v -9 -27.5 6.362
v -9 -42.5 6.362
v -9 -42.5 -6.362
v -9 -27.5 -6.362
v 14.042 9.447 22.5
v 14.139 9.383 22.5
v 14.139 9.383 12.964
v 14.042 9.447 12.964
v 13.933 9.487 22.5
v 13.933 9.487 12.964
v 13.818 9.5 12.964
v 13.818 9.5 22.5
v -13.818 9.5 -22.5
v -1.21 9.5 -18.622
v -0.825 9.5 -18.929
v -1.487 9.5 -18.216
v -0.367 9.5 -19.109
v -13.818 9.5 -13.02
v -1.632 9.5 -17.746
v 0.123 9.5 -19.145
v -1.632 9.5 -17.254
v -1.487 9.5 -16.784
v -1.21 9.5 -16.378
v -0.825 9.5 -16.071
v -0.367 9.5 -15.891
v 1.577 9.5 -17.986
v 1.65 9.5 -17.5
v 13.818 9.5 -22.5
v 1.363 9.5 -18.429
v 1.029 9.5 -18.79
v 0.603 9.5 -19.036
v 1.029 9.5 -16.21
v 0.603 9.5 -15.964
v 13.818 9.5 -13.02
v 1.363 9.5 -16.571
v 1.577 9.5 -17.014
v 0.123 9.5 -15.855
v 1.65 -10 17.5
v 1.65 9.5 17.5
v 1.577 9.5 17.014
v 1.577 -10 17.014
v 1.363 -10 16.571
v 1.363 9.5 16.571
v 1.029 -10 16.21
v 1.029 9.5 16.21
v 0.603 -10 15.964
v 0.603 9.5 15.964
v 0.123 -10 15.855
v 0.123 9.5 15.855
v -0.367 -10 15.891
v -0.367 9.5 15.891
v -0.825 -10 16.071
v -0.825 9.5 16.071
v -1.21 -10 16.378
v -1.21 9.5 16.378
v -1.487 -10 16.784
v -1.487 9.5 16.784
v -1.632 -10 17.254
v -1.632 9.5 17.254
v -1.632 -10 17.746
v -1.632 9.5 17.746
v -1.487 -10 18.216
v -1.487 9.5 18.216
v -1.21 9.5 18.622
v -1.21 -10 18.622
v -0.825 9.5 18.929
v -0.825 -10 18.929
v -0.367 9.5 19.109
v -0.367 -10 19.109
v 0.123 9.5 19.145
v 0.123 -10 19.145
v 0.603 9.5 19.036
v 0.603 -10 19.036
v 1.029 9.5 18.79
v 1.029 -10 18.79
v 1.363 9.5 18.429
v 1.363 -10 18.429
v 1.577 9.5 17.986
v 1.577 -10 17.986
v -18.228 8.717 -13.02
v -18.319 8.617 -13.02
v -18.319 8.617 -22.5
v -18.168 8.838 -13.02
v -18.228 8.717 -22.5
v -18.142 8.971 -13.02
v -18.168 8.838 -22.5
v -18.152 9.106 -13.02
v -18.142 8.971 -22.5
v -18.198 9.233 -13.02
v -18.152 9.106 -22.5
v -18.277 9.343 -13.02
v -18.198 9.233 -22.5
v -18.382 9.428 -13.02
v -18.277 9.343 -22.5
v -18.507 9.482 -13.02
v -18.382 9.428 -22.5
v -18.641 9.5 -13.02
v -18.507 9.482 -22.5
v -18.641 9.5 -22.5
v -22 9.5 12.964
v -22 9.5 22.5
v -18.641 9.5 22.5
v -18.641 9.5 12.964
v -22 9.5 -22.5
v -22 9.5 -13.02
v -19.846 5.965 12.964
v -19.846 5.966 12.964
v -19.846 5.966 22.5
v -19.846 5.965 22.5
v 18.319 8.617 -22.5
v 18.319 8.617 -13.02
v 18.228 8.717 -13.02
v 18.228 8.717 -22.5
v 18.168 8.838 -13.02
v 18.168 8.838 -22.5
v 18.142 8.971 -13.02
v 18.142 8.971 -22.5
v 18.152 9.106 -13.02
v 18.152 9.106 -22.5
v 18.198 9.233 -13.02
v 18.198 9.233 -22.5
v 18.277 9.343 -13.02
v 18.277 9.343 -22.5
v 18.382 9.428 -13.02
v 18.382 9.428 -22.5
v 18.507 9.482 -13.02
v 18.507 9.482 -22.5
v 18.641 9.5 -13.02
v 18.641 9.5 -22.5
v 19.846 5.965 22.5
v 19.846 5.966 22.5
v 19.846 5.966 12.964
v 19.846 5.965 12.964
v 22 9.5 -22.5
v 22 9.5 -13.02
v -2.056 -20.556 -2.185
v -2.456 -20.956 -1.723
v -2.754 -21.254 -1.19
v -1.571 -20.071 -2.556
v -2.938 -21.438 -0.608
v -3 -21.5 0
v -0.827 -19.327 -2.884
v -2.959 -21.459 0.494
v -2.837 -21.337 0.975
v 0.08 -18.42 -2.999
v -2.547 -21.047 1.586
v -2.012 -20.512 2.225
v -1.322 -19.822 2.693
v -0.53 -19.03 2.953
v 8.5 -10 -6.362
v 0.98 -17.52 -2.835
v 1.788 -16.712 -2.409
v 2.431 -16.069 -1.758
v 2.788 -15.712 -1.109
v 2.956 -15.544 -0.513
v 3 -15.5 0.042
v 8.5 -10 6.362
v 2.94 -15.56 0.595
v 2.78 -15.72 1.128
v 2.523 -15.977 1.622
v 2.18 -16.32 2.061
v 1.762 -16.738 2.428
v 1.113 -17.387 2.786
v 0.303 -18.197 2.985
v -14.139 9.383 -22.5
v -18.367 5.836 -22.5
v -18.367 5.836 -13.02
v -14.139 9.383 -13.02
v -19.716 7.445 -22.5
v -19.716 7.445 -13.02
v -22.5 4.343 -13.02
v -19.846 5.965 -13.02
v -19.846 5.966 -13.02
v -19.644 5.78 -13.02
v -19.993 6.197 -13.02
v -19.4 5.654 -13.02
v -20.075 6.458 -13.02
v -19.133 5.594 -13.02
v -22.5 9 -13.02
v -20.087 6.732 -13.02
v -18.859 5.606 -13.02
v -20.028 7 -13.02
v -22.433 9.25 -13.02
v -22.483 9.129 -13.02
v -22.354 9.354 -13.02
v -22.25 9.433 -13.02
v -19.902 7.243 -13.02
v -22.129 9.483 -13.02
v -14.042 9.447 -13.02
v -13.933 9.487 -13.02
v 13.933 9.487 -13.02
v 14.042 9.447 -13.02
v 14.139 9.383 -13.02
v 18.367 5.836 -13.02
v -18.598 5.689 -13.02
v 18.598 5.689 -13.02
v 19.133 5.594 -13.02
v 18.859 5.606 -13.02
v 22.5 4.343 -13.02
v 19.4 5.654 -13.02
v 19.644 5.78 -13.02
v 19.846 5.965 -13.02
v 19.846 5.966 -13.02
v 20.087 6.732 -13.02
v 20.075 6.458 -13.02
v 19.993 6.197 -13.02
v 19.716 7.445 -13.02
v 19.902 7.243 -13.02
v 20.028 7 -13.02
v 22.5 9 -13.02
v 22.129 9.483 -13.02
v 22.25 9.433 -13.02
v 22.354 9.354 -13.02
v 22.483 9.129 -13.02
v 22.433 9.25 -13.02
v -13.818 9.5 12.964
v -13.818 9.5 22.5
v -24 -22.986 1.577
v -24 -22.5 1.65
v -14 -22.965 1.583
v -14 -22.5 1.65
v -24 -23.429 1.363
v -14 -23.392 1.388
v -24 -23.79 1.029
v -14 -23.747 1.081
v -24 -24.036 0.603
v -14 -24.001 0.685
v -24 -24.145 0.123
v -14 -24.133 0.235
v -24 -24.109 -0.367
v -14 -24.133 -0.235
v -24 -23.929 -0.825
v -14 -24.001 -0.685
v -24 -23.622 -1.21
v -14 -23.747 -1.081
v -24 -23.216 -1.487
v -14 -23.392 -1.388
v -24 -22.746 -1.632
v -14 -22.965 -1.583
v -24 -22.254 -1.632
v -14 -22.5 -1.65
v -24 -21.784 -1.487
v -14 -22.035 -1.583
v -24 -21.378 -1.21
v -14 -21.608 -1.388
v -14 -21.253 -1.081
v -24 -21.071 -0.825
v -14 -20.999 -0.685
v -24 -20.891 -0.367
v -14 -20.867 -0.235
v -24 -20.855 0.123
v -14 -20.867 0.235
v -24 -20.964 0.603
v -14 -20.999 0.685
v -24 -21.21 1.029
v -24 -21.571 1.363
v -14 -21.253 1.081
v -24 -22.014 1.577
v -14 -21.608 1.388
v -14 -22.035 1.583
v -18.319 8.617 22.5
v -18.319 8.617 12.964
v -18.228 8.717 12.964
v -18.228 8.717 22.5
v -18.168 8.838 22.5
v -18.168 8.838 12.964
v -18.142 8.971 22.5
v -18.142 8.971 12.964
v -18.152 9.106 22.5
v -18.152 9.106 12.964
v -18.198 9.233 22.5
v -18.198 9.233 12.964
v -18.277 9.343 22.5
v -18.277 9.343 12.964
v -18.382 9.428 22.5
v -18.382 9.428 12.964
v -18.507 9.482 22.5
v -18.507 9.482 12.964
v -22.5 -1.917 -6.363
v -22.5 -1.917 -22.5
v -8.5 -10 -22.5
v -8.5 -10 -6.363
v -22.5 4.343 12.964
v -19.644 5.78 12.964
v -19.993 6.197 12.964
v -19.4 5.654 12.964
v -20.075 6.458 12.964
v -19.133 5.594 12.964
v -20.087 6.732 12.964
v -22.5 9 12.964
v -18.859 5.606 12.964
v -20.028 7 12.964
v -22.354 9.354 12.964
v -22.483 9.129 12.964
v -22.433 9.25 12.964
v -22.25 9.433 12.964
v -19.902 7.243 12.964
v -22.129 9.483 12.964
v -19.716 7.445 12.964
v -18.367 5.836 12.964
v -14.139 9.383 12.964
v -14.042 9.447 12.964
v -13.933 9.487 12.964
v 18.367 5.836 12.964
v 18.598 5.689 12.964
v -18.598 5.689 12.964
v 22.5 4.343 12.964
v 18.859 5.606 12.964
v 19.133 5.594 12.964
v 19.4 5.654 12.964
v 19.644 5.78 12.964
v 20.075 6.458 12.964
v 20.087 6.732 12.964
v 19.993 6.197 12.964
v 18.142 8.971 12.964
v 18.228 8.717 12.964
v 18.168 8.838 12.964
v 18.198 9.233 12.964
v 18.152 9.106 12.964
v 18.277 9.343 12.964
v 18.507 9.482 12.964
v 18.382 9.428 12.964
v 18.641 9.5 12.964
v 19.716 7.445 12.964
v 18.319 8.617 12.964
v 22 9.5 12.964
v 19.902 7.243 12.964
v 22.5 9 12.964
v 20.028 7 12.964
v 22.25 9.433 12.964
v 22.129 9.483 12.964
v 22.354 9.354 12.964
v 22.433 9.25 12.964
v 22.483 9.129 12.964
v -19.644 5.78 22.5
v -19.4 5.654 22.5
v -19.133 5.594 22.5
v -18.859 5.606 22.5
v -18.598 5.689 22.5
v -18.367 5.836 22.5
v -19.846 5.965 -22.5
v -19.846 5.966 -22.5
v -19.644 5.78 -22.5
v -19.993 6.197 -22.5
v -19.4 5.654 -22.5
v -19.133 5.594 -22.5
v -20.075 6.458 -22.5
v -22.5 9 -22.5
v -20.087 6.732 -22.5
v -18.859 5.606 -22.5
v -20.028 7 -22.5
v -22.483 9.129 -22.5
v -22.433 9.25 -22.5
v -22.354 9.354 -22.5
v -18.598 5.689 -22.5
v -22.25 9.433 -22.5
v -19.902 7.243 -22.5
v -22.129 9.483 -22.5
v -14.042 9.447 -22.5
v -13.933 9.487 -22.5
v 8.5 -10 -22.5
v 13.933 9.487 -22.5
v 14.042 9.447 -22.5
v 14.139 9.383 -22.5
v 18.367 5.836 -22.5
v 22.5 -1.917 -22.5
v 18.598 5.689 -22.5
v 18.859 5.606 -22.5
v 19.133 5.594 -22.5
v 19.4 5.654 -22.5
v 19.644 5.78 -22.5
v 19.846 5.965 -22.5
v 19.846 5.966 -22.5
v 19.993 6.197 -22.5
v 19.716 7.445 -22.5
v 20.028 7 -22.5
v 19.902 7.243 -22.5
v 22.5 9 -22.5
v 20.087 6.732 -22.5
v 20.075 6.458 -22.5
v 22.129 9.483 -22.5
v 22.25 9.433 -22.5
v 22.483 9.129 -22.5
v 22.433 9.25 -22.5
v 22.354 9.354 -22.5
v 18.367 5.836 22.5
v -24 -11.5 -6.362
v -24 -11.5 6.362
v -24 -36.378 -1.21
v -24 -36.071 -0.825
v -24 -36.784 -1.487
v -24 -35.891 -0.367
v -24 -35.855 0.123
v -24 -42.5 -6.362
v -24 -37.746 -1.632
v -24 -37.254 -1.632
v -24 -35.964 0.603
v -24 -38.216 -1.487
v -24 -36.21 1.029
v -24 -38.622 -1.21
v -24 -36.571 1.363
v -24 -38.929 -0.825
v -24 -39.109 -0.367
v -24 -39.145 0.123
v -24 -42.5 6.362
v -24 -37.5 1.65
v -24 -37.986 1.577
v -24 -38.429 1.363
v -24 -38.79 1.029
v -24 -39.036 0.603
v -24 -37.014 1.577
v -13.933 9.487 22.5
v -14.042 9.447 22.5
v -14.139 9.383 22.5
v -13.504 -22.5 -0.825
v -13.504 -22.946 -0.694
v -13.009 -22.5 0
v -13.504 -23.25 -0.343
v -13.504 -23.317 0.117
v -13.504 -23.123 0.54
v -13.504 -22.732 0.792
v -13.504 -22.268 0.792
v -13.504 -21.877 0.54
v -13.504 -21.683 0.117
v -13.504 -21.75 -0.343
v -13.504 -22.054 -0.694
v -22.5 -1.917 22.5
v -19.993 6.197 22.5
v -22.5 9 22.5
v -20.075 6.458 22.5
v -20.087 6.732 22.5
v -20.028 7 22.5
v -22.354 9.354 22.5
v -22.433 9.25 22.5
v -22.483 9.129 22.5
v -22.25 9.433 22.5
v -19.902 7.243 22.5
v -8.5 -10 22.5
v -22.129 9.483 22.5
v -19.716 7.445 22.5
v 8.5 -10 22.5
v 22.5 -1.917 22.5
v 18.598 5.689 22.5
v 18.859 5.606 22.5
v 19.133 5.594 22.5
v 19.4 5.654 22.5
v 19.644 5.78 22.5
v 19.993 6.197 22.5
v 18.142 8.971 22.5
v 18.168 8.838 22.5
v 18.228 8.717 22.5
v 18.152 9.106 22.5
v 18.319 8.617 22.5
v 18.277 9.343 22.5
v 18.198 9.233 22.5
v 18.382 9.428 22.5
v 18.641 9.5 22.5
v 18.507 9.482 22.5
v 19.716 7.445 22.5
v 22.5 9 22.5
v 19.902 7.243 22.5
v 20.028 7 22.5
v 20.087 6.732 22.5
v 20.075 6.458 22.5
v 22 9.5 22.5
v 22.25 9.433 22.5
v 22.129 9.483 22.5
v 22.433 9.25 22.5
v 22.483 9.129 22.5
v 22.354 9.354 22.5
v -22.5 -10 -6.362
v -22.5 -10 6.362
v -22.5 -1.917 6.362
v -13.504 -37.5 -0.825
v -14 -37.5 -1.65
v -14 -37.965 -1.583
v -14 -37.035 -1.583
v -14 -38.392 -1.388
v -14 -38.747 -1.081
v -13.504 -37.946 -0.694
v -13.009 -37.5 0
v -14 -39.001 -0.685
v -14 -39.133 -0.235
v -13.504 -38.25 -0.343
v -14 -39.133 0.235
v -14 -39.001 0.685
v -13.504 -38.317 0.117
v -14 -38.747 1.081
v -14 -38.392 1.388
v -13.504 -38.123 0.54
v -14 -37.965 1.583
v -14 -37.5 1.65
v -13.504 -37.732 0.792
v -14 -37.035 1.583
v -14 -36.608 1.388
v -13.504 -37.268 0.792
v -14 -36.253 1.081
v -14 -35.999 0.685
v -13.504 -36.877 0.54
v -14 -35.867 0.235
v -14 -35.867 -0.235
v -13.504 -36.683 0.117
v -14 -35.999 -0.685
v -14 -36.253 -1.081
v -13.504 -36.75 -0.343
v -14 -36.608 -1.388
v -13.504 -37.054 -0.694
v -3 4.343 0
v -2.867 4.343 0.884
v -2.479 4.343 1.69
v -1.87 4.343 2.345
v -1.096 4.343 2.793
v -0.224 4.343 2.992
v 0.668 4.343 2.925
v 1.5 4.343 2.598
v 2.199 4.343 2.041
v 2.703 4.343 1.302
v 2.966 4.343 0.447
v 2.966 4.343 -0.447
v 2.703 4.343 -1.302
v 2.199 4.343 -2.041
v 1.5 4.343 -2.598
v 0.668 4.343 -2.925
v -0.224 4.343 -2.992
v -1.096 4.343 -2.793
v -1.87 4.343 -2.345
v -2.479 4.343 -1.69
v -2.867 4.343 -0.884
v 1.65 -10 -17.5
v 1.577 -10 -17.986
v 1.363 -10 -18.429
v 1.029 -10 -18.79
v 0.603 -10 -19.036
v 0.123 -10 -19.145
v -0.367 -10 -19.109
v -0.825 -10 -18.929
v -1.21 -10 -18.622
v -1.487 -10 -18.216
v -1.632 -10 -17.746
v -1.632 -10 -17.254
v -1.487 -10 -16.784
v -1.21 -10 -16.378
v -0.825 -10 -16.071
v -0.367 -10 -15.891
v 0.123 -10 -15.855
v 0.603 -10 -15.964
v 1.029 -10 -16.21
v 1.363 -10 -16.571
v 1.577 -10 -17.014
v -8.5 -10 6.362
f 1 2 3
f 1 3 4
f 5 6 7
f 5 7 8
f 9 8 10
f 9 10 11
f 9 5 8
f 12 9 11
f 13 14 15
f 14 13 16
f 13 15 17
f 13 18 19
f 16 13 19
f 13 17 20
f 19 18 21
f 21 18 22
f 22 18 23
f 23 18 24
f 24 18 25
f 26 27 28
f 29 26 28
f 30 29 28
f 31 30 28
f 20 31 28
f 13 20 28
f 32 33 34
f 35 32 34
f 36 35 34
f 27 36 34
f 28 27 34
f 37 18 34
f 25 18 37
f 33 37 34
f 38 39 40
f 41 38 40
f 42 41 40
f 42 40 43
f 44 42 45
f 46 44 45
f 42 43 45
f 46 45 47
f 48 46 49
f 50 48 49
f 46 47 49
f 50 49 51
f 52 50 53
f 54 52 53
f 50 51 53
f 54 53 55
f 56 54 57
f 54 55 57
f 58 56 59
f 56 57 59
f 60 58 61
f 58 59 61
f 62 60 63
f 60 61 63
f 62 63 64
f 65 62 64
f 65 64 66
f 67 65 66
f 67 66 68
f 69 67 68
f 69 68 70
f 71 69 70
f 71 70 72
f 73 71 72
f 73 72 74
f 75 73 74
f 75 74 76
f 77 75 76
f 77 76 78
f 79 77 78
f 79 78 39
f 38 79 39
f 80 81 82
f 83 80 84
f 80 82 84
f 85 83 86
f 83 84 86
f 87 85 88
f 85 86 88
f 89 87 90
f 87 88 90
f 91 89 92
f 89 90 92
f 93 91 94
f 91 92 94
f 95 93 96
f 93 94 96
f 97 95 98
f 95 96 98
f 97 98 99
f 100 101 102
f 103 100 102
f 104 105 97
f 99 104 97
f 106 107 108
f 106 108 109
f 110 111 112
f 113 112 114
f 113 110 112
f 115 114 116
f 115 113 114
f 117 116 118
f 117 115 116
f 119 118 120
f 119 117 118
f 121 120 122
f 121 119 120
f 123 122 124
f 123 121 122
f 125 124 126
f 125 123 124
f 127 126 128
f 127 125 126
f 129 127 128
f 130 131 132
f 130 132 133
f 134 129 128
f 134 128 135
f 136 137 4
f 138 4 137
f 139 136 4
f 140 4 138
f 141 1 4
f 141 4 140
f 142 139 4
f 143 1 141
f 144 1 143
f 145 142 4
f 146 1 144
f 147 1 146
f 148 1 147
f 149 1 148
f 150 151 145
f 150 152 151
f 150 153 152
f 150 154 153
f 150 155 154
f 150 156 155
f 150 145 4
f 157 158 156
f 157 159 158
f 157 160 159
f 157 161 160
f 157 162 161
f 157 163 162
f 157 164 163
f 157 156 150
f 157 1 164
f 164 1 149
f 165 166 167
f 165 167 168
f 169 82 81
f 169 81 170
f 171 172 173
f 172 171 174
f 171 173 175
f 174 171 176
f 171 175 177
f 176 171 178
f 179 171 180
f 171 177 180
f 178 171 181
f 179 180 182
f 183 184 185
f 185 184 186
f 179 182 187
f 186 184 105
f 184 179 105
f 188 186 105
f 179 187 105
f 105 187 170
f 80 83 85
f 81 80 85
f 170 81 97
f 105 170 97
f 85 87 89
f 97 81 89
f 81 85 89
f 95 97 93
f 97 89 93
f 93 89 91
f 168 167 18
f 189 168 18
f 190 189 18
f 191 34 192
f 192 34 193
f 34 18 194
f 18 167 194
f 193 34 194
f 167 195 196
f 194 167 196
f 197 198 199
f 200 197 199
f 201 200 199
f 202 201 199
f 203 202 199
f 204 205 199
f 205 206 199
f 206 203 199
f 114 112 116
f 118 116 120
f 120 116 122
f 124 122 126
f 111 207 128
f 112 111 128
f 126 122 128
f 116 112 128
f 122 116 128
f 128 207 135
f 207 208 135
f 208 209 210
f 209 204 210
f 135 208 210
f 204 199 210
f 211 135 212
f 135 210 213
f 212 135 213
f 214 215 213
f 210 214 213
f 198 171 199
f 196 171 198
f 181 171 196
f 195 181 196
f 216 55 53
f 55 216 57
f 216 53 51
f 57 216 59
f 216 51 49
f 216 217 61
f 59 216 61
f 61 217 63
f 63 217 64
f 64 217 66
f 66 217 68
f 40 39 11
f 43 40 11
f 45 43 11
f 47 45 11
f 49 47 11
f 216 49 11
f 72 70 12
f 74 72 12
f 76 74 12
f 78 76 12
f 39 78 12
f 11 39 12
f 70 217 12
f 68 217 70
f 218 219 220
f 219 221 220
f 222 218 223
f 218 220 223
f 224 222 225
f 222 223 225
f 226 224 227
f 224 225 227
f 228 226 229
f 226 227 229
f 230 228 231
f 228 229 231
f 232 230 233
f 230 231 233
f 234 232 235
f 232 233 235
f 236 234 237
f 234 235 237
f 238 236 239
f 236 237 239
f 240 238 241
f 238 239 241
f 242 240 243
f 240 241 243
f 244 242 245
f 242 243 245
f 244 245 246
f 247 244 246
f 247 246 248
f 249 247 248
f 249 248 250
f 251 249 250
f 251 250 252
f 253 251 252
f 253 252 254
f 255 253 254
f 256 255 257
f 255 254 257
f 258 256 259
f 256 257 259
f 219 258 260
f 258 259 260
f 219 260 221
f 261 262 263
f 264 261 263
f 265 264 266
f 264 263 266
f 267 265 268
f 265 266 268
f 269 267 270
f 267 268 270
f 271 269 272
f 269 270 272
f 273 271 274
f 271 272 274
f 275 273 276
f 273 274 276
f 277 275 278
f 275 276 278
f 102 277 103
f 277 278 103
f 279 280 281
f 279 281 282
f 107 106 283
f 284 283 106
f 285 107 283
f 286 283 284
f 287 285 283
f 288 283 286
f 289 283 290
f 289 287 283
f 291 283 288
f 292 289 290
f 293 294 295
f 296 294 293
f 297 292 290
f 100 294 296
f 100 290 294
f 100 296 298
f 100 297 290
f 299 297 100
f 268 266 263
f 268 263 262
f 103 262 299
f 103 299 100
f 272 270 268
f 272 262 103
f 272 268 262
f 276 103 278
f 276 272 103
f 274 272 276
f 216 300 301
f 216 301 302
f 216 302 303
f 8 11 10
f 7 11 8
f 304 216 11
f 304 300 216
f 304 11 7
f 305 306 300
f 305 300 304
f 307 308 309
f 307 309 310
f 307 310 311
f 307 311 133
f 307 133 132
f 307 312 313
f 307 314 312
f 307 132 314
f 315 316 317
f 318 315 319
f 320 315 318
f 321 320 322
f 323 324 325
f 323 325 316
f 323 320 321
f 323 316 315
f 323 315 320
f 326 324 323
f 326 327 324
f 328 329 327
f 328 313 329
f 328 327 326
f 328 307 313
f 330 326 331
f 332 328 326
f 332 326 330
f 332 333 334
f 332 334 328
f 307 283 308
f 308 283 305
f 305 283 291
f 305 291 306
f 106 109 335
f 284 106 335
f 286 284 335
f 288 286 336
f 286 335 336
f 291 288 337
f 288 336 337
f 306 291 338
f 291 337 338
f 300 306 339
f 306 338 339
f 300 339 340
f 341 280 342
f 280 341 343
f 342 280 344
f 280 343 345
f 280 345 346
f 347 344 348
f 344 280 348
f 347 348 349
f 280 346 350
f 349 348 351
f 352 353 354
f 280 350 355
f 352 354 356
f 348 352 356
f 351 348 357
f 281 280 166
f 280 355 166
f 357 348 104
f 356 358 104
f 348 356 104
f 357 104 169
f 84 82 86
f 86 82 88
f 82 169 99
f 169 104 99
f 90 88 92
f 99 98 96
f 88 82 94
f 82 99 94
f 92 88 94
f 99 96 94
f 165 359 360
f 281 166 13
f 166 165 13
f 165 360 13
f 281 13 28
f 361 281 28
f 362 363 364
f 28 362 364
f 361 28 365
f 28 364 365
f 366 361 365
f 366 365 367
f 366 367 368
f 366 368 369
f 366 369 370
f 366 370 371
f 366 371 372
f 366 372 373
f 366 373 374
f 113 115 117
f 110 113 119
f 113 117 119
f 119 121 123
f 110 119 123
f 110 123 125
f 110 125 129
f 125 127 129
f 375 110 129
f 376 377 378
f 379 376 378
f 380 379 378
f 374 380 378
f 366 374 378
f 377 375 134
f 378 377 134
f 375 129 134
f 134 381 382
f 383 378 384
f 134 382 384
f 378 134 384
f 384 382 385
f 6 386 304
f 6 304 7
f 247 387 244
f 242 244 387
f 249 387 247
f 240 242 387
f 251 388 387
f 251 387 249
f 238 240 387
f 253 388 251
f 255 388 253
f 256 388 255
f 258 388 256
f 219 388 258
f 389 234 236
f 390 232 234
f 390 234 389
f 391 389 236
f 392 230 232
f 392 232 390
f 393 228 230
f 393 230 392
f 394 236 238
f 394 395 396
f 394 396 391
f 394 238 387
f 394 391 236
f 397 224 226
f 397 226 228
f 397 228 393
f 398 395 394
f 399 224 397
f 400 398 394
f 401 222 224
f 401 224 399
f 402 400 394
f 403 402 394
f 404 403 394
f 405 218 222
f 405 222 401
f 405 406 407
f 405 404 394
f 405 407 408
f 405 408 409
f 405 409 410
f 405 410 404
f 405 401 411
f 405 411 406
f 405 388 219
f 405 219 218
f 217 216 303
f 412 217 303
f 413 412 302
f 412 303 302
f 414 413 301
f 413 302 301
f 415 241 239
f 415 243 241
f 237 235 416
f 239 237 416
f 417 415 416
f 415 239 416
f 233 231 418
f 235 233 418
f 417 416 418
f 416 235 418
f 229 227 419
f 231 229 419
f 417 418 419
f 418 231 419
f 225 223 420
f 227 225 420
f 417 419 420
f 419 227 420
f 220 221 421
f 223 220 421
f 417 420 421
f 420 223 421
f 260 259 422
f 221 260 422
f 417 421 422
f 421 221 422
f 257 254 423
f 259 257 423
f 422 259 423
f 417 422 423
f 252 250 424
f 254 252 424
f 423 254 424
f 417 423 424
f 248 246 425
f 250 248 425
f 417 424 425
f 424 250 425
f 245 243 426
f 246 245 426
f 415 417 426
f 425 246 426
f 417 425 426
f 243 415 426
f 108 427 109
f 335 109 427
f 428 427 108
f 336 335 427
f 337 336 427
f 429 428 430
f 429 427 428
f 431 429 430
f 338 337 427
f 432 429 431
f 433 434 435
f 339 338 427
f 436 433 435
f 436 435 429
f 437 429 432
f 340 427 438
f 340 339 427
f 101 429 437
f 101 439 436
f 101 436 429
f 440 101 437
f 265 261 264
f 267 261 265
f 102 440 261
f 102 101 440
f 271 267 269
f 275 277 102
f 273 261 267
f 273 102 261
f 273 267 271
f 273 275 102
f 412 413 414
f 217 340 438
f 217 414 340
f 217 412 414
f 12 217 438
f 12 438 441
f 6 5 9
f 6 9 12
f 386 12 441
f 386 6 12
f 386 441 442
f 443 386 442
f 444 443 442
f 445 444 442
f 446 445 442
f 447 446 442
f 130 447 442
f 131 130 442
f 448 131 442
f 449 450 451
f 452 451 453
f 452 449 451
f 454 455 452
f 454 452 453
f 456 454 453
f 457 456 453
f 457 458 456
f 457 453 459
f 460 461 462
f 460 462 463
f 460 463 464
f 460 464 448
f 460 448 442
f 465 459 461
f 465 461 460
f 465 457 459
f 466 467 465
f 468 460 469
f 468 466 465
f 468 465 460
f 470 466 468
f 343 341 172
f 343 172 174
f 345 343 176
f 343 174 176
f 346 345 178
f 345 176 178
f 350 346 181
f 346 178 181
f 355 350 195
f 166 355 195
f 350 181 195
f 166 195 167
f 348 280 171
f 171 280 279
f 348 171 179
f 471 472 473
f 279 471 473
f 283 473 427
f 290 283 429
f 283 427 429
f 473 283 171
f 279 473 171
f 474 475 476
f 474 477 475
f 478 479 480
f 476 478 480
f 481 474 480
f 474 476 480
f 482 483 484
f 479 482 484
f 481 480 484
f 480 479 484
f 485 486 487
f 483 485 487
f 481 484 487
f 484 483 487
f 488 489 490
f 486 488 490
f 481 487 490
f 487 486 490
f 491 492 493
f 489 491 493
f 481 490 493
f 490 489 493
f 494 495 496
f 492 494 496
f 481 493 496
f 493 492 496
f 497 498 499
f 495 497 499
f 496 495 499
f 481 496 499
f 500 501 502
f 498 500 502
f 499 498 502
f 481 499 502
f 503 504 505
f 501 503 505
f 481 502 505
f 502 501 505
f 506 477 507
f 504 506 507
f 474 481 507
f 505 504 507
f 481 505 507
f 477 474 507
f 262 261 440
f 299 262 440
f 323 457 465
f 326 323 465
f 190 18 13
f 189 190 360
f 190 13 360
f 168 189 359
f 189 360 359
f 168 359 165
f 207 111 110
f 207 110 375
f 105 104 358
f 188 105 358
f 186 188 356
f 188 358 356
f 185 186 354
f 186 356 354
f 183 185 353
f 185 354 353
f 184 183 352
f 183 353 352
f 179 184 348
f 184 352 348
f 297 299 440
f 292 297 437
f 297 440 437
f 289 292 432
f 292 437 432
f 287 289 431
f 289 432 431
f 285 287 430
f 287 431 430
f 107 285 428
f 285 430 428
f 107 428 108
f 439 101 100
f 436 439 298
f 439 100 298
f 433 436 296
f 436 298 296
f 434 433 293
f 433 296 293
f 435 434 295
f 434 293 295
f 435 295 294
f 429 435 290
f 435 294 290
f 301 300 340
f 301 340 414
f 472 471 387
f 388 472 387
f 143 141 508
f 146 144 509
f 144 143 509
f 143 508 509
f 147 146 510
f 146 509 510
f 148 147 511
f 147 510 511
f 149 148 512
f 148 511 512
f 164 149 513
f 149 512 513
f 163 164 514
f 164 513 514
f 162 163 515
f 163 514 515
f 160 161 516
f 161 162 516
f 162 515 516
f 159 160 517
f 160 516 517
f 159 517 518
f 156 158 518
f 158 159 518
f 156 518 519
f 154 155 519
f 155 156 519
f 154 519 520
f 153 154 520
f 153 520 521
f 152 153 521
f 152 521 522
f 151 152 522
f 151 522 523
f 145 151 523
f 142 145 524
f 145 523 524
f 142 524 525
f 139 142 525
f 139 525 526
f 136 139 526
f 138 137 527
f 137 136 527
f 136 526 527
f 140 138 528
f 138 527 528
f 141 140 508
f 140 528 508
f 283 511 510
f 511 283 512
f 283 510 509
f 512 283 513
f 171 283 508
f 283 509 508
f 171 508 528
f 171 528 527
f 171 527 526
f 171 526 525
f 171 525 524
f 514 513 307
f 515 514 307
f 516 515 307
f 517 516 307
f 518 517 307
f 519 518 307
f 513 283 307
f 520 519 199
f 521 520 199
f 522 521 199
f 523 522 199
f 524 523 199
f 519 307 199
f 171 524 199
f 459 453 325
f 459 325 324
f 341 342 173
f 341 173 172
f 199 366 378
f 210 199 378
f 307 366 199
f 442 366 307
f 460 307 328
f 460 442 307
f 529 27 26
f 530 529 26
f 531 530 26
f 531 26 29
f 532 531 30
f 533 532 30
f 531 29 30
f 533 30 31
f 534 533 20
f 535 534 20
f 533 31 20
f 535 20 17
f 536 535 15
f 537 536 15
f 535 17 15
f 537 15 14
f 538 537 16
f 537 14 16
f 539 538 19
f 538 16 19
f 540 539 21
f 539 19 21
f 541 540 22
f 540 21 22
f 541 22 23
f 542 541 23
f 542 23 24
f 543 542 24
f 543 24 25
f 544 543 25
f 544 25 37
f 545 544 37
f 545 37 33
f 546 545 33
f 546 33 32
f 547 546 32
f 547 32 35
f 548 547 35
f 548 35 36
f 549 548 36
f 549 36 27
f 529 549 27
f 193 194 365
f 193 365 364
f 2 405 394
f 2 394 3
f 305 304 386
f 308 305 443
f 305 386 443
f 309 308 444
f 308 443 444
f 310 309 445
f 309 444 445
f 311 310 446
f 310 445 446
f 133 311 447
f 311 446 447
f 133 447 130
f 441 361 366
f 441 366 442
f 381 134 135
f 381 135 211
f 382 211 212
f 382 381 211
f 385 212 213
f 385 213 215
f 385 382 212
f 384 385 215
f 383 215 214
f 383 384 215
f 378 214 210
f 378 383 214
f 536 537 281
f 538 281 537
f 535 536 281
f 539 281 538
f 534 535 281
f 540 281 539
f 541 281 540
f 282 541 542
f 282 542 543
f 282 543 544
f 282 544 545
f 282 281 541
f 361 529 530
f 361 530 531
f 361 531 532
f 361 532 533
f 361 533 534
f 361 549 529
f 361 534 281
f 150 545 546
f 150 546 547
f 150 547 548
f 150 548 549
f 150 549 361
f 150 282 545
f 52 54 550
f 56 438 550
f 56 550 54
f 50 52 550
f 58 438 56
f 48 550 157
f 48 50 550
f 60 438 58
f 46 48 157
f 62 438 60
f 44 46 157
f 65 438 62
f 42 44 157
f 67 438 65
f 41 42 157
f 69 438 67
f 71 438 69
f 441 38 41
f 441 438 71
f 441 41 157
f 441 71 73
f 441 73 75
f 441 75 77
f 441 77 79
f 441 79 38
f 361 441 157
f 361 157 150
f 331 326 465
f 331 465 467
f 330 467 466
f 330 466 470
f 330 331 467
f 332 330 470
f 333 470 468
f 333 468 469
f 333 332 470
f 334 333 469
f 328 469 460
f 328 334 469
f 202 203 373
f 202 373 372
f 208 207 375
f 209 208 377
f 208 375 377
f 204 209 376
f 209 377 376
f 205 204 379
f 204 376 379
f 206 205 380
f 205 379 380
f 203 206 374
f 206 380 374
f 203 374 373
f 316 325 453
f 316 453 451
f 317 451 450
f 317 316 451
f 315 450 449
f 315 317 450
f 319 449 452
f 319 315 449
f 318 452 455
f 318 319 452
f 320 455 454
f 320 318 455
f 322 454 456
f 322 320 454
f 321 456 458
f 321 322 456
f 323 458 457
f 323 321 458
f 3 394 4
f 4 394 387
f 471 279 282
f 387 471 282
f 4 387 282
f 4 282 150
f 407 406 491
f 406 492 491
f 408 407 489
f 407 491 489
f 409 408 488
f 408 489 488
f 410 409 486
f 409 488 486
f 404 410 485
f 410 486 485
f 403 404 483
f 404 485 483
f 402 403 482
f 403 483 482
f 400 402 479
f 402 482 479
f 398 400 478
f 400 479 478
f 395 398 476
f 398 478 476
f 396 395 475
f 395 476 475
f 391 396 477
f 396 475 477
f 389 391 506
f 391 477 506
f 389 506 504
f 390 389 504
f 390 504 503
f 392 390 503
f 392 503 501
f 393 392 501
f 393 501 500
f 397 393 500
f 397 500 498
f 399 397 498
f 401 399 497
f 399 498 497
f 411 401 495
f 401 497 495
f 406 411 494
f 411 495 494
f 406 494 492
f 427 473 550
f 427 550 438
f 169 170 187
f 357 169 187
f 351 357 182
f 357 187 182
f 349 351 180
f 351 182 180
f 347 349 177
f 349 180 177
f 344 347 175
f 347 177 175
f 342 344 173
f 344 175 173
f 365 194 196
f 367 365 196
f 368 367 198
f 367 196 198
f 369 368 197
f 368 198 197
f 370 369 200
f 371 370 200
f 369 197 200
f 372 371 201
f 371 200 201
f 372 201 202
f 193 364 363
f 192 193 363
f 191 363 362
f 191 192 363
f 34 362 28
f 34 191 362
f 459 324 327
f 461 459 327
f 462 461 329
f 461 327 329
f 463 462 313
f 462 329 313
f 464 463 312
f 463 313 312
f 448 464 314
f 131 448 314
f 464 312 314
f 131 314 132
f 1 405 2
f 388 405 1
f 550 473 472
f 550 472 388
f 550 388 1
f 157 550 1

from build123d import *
from OCP.BRepFilletAPI import BRepFilletAPI_MakeChamfer

# Parameters (mm, degrees)
SKETCH1_W                 = 45
SKETCH1_H                 = 19.5
BOSS_EXTRUDE1_DEPTH       = 22.5
M4X0_7_TAPPED_HOLE2_D     = 3.3
BOSS_EXTRUDE3_DEPTH       = 6.3625
M4X0_7_TAPPED_HOLE1_D     = 3.3
M4X0_7_TAPPED_HOLE1_DEPTH = 10
M4X0_7_TAPPED_HOLE1_TIP   = 0.991420021
CUT_EXTRUDE2_DEPTH        = 85
SKETCH2_R                 = 3
CUT_EXTRUDE1_DEPTH        = 50
CUT_EXTRUDE3_DEPTH        = 25
FILLET1_R                 = 1.05
FILLET2_R                 = 1.05
FILLET3_R                 = 0.5
SKETCH12_W                = 25.984765903
SKETCH12_H                = 10.03603234
CUT_EXTRUDE4_DEPTH        = 72.15
CHAMFER1_SIZE             = 14
CHAMFER1_SIZE_2           = 8.082903769


with BuildPart() as part:
    # Sketch1 → Boss-Extrude1 (new, symmetric)
    with BuildSketch(Plane.XY):
        with Locations((0, -0.25)):
            Rectangle(SKETCH1_W, SKETCH1_H)
    extrude(amount=BOSS_EXTRUDE1_DEPTH, both=True)

    # M4x0.7 Tapped Hole2 (through all)
    with Locations(Plane(origin=(0, -10, 0), x_dir=(-1, 0, 0), z_dir=(0, -1, 0))):
        with Locations((0, -17.5), (0, 17.5)):
            Hole(M4X0_7_TAPPED_HOLE2_D / 2)

    # Sketch7 → Boss-Extrude3 (add, symmetric)
    with BuildSketch(Plane.XY):
        Polygon((-22.5, -7.5), (-24, -7.5), (-24, -42.5), (-9, -42.5), (-9, -27.5), (8.5, -10), (-22.5, -10), align=None)
    extrude(amount=BOSS_EXTRUDE3_DEPTH, both=True)

    # M4x0.7 Tapped Hole1
    with Locations(Plane(origin=(-24, 0, 0), x_dir=(0, 0, -1), z_dir=(-1, 0, 0))):
        with Locations((0, 37.5), (0, 22.5)):
            Hole(M4X0_7_TAPPED_HOLE1_D / 2, depth=M4X0_7_TAPPED_HOLE1_DEPTH)
            with Locations((0, 0, -(M4X0_7_TAPPED_HOLE1_DEPTH + M4X0_7_TAPPED_HOLE1_TIP / 2))):  # 118° drill point
                Cone(0, M4X0_7_TAPPED_HOLE1_D / 2, M4X0_7_TAPPED_HOLE1_TIP, mode=Mode.SUBTRACT)

    # Sketch10 → Cut-Extrude2 (cut)
    with BuildSketch(Plane(origin=(0, 0, -6.3625), x_dir=(-1, 0, 0), z_dir=(0, 0, -1))):
        Polygon((22.5, -10), (24, -11.5), (24, -7.5), (22.5, -7.5), align=None)
    extrude(amount=-CUT_EXTRUDE2_DEPTH, mode=Mode.SUBTRACT)

    # Sketch2 → Cut-Extrude1 (cut)
    with BuildSketch(Plane(origin=(0, 9.5, 0), x_dir=(1, 0, 0), z_dir=(0, 1, 0))):
        with Locations(Location((0, 0, 0), (0, 0, 180))):
            Circle(SKETCH2_R)
    extrude(amount=-CUT_EXTRUDE1_DEPTH, mode=Mode.SUBTRACT)

    # Sketch11 → Cut-Extrude3 (cut, symmetric)
    with BuildSketch(Plane.XY):
        Polygon((-17.267020036, 9.5), (-20.520653971, 6.769876965), (-19.170799991, 5.161183635), (-14, 9.5), align=None)
        Polygon((14, 9.5), (17.267020036, 9.5), (20.520653971, 6.769876965), (19.170799991, 5.161183635), align=None)
    extrude(amount=CUT_EXTRUDE3_DEPTH, both=True, mode=Mode.SUBTRACT)

    # Fillet1
    fillet1_edges = [part.edges().sort_by_distance(p)[0] for p in [
        (-19.170799991, 5.161183635, 0),
        (-20.520653971, 6.769876965, 0),
    ]]
    fillet(fillet1_edges, radius=FILLET1_R - 0.0001)  # a hair under: the kernel refuses the full size

    # Fillet2
    fillet2_edges = [part.edges().sort_by_distance(p)[0] for p in [
        (19.170799991, 5.161183635, 0),
        (20.520653971, 6.769876965, 0),
    ]]
    fillet(fillet2_edges, radius=FILLET2_R - 0.0001)  # a hair under: the kernel refuses the full size

    # Fillet3
    fillet3_edges = [part.edges().sort_by_distance(p)[0] for p in [
        (14, 9.5, 0),
        (17.267020036, 9.5, 0),
        (-22.5, 9.5, 0),
        (22.5, 9.5, 0),
        (-17.267020036, 9.5, 0),
        (-14, 9.5, 0),
    ]]
    fillet(fillet3_edges, radius=FILLET3_R)

    # Sketch12 → Cut-Extrude4 (cut)
    with BuildSketch(Plane(origin=(22.5, 0, 0), x_dir=(0, 0, -1), z_dir=(1, 0, 0))):
        with Locations((0.027906174, 9.360607609)):
            Rectangle(SKETCH12_W, SKETCH12_H)
    extrude(amount=-CUT_EXTRUDE4_DEPTH, mode=Mode.SUBTRACT)

    # Chamfer1
    chamfer1_edges_1 = [part.edges().sort_by_distance(p)[0] for p in [
        (-22.5, -10, -14.43125),
    ]]
    chamfer1_side_1 = [part.faces().sort_by_distance(p)[0] for p in [
        (-22.338341925, -10, -14.43125),
    ]]
    chamfer1_edges_2 = [part.edges().sort_by_distance(p)[0] for p in [
        (22.5, -10, 0),
    ]]
    chamfer1_side_2 = [part.faces().sort_by_distance(p)[0] for p in [
        (22.5, -9.838341925, 0),
    ]]
    chamfer1_edges_3 = [part.edges().sort_by_distance(p)[0] for p in [
        (-22.5, -10, 14.43125),
    ]]
    chamfer1_side_3 = [part.faces().sort_by_distance(p)[0] for p in [
        (-22.338341925, -10, 14.43125),
    ]]
    chamfer1 = BRepFilletAPI_MakeChamfer(part.part.solid().wrapped)
    for e in chamfer1_edges_1:
        chamfer1.Add(CHAMFER1_SIZE - 0.0001, CHAMFER1_SIZE_2 - 0.0001, e.wrapped, chamfer1_side_1[0].wrapped)
    for e in chamfer1_edges_2:
        chamfer1.Add(CHAMFER1_SIZE_2 - 0.0001, CHAMFER1_SIZE - 0.0001, e.wrapped, chamfer1_side_2[0].wrapped)
    for e in chamfer1_edges_3:
        chamfer1.Add(CHAMFER1_SIZE - 0.0001, CHAMFER1_SIZE_2 - 0.0001, e.wrapped, chamfer1_side_3[0].wrapped)
    add(Compound.cast(chamfer1.Shape()), mode=Mode.REPLACE)  # a hair under: the kernel refuses the full size


solid = part.part
